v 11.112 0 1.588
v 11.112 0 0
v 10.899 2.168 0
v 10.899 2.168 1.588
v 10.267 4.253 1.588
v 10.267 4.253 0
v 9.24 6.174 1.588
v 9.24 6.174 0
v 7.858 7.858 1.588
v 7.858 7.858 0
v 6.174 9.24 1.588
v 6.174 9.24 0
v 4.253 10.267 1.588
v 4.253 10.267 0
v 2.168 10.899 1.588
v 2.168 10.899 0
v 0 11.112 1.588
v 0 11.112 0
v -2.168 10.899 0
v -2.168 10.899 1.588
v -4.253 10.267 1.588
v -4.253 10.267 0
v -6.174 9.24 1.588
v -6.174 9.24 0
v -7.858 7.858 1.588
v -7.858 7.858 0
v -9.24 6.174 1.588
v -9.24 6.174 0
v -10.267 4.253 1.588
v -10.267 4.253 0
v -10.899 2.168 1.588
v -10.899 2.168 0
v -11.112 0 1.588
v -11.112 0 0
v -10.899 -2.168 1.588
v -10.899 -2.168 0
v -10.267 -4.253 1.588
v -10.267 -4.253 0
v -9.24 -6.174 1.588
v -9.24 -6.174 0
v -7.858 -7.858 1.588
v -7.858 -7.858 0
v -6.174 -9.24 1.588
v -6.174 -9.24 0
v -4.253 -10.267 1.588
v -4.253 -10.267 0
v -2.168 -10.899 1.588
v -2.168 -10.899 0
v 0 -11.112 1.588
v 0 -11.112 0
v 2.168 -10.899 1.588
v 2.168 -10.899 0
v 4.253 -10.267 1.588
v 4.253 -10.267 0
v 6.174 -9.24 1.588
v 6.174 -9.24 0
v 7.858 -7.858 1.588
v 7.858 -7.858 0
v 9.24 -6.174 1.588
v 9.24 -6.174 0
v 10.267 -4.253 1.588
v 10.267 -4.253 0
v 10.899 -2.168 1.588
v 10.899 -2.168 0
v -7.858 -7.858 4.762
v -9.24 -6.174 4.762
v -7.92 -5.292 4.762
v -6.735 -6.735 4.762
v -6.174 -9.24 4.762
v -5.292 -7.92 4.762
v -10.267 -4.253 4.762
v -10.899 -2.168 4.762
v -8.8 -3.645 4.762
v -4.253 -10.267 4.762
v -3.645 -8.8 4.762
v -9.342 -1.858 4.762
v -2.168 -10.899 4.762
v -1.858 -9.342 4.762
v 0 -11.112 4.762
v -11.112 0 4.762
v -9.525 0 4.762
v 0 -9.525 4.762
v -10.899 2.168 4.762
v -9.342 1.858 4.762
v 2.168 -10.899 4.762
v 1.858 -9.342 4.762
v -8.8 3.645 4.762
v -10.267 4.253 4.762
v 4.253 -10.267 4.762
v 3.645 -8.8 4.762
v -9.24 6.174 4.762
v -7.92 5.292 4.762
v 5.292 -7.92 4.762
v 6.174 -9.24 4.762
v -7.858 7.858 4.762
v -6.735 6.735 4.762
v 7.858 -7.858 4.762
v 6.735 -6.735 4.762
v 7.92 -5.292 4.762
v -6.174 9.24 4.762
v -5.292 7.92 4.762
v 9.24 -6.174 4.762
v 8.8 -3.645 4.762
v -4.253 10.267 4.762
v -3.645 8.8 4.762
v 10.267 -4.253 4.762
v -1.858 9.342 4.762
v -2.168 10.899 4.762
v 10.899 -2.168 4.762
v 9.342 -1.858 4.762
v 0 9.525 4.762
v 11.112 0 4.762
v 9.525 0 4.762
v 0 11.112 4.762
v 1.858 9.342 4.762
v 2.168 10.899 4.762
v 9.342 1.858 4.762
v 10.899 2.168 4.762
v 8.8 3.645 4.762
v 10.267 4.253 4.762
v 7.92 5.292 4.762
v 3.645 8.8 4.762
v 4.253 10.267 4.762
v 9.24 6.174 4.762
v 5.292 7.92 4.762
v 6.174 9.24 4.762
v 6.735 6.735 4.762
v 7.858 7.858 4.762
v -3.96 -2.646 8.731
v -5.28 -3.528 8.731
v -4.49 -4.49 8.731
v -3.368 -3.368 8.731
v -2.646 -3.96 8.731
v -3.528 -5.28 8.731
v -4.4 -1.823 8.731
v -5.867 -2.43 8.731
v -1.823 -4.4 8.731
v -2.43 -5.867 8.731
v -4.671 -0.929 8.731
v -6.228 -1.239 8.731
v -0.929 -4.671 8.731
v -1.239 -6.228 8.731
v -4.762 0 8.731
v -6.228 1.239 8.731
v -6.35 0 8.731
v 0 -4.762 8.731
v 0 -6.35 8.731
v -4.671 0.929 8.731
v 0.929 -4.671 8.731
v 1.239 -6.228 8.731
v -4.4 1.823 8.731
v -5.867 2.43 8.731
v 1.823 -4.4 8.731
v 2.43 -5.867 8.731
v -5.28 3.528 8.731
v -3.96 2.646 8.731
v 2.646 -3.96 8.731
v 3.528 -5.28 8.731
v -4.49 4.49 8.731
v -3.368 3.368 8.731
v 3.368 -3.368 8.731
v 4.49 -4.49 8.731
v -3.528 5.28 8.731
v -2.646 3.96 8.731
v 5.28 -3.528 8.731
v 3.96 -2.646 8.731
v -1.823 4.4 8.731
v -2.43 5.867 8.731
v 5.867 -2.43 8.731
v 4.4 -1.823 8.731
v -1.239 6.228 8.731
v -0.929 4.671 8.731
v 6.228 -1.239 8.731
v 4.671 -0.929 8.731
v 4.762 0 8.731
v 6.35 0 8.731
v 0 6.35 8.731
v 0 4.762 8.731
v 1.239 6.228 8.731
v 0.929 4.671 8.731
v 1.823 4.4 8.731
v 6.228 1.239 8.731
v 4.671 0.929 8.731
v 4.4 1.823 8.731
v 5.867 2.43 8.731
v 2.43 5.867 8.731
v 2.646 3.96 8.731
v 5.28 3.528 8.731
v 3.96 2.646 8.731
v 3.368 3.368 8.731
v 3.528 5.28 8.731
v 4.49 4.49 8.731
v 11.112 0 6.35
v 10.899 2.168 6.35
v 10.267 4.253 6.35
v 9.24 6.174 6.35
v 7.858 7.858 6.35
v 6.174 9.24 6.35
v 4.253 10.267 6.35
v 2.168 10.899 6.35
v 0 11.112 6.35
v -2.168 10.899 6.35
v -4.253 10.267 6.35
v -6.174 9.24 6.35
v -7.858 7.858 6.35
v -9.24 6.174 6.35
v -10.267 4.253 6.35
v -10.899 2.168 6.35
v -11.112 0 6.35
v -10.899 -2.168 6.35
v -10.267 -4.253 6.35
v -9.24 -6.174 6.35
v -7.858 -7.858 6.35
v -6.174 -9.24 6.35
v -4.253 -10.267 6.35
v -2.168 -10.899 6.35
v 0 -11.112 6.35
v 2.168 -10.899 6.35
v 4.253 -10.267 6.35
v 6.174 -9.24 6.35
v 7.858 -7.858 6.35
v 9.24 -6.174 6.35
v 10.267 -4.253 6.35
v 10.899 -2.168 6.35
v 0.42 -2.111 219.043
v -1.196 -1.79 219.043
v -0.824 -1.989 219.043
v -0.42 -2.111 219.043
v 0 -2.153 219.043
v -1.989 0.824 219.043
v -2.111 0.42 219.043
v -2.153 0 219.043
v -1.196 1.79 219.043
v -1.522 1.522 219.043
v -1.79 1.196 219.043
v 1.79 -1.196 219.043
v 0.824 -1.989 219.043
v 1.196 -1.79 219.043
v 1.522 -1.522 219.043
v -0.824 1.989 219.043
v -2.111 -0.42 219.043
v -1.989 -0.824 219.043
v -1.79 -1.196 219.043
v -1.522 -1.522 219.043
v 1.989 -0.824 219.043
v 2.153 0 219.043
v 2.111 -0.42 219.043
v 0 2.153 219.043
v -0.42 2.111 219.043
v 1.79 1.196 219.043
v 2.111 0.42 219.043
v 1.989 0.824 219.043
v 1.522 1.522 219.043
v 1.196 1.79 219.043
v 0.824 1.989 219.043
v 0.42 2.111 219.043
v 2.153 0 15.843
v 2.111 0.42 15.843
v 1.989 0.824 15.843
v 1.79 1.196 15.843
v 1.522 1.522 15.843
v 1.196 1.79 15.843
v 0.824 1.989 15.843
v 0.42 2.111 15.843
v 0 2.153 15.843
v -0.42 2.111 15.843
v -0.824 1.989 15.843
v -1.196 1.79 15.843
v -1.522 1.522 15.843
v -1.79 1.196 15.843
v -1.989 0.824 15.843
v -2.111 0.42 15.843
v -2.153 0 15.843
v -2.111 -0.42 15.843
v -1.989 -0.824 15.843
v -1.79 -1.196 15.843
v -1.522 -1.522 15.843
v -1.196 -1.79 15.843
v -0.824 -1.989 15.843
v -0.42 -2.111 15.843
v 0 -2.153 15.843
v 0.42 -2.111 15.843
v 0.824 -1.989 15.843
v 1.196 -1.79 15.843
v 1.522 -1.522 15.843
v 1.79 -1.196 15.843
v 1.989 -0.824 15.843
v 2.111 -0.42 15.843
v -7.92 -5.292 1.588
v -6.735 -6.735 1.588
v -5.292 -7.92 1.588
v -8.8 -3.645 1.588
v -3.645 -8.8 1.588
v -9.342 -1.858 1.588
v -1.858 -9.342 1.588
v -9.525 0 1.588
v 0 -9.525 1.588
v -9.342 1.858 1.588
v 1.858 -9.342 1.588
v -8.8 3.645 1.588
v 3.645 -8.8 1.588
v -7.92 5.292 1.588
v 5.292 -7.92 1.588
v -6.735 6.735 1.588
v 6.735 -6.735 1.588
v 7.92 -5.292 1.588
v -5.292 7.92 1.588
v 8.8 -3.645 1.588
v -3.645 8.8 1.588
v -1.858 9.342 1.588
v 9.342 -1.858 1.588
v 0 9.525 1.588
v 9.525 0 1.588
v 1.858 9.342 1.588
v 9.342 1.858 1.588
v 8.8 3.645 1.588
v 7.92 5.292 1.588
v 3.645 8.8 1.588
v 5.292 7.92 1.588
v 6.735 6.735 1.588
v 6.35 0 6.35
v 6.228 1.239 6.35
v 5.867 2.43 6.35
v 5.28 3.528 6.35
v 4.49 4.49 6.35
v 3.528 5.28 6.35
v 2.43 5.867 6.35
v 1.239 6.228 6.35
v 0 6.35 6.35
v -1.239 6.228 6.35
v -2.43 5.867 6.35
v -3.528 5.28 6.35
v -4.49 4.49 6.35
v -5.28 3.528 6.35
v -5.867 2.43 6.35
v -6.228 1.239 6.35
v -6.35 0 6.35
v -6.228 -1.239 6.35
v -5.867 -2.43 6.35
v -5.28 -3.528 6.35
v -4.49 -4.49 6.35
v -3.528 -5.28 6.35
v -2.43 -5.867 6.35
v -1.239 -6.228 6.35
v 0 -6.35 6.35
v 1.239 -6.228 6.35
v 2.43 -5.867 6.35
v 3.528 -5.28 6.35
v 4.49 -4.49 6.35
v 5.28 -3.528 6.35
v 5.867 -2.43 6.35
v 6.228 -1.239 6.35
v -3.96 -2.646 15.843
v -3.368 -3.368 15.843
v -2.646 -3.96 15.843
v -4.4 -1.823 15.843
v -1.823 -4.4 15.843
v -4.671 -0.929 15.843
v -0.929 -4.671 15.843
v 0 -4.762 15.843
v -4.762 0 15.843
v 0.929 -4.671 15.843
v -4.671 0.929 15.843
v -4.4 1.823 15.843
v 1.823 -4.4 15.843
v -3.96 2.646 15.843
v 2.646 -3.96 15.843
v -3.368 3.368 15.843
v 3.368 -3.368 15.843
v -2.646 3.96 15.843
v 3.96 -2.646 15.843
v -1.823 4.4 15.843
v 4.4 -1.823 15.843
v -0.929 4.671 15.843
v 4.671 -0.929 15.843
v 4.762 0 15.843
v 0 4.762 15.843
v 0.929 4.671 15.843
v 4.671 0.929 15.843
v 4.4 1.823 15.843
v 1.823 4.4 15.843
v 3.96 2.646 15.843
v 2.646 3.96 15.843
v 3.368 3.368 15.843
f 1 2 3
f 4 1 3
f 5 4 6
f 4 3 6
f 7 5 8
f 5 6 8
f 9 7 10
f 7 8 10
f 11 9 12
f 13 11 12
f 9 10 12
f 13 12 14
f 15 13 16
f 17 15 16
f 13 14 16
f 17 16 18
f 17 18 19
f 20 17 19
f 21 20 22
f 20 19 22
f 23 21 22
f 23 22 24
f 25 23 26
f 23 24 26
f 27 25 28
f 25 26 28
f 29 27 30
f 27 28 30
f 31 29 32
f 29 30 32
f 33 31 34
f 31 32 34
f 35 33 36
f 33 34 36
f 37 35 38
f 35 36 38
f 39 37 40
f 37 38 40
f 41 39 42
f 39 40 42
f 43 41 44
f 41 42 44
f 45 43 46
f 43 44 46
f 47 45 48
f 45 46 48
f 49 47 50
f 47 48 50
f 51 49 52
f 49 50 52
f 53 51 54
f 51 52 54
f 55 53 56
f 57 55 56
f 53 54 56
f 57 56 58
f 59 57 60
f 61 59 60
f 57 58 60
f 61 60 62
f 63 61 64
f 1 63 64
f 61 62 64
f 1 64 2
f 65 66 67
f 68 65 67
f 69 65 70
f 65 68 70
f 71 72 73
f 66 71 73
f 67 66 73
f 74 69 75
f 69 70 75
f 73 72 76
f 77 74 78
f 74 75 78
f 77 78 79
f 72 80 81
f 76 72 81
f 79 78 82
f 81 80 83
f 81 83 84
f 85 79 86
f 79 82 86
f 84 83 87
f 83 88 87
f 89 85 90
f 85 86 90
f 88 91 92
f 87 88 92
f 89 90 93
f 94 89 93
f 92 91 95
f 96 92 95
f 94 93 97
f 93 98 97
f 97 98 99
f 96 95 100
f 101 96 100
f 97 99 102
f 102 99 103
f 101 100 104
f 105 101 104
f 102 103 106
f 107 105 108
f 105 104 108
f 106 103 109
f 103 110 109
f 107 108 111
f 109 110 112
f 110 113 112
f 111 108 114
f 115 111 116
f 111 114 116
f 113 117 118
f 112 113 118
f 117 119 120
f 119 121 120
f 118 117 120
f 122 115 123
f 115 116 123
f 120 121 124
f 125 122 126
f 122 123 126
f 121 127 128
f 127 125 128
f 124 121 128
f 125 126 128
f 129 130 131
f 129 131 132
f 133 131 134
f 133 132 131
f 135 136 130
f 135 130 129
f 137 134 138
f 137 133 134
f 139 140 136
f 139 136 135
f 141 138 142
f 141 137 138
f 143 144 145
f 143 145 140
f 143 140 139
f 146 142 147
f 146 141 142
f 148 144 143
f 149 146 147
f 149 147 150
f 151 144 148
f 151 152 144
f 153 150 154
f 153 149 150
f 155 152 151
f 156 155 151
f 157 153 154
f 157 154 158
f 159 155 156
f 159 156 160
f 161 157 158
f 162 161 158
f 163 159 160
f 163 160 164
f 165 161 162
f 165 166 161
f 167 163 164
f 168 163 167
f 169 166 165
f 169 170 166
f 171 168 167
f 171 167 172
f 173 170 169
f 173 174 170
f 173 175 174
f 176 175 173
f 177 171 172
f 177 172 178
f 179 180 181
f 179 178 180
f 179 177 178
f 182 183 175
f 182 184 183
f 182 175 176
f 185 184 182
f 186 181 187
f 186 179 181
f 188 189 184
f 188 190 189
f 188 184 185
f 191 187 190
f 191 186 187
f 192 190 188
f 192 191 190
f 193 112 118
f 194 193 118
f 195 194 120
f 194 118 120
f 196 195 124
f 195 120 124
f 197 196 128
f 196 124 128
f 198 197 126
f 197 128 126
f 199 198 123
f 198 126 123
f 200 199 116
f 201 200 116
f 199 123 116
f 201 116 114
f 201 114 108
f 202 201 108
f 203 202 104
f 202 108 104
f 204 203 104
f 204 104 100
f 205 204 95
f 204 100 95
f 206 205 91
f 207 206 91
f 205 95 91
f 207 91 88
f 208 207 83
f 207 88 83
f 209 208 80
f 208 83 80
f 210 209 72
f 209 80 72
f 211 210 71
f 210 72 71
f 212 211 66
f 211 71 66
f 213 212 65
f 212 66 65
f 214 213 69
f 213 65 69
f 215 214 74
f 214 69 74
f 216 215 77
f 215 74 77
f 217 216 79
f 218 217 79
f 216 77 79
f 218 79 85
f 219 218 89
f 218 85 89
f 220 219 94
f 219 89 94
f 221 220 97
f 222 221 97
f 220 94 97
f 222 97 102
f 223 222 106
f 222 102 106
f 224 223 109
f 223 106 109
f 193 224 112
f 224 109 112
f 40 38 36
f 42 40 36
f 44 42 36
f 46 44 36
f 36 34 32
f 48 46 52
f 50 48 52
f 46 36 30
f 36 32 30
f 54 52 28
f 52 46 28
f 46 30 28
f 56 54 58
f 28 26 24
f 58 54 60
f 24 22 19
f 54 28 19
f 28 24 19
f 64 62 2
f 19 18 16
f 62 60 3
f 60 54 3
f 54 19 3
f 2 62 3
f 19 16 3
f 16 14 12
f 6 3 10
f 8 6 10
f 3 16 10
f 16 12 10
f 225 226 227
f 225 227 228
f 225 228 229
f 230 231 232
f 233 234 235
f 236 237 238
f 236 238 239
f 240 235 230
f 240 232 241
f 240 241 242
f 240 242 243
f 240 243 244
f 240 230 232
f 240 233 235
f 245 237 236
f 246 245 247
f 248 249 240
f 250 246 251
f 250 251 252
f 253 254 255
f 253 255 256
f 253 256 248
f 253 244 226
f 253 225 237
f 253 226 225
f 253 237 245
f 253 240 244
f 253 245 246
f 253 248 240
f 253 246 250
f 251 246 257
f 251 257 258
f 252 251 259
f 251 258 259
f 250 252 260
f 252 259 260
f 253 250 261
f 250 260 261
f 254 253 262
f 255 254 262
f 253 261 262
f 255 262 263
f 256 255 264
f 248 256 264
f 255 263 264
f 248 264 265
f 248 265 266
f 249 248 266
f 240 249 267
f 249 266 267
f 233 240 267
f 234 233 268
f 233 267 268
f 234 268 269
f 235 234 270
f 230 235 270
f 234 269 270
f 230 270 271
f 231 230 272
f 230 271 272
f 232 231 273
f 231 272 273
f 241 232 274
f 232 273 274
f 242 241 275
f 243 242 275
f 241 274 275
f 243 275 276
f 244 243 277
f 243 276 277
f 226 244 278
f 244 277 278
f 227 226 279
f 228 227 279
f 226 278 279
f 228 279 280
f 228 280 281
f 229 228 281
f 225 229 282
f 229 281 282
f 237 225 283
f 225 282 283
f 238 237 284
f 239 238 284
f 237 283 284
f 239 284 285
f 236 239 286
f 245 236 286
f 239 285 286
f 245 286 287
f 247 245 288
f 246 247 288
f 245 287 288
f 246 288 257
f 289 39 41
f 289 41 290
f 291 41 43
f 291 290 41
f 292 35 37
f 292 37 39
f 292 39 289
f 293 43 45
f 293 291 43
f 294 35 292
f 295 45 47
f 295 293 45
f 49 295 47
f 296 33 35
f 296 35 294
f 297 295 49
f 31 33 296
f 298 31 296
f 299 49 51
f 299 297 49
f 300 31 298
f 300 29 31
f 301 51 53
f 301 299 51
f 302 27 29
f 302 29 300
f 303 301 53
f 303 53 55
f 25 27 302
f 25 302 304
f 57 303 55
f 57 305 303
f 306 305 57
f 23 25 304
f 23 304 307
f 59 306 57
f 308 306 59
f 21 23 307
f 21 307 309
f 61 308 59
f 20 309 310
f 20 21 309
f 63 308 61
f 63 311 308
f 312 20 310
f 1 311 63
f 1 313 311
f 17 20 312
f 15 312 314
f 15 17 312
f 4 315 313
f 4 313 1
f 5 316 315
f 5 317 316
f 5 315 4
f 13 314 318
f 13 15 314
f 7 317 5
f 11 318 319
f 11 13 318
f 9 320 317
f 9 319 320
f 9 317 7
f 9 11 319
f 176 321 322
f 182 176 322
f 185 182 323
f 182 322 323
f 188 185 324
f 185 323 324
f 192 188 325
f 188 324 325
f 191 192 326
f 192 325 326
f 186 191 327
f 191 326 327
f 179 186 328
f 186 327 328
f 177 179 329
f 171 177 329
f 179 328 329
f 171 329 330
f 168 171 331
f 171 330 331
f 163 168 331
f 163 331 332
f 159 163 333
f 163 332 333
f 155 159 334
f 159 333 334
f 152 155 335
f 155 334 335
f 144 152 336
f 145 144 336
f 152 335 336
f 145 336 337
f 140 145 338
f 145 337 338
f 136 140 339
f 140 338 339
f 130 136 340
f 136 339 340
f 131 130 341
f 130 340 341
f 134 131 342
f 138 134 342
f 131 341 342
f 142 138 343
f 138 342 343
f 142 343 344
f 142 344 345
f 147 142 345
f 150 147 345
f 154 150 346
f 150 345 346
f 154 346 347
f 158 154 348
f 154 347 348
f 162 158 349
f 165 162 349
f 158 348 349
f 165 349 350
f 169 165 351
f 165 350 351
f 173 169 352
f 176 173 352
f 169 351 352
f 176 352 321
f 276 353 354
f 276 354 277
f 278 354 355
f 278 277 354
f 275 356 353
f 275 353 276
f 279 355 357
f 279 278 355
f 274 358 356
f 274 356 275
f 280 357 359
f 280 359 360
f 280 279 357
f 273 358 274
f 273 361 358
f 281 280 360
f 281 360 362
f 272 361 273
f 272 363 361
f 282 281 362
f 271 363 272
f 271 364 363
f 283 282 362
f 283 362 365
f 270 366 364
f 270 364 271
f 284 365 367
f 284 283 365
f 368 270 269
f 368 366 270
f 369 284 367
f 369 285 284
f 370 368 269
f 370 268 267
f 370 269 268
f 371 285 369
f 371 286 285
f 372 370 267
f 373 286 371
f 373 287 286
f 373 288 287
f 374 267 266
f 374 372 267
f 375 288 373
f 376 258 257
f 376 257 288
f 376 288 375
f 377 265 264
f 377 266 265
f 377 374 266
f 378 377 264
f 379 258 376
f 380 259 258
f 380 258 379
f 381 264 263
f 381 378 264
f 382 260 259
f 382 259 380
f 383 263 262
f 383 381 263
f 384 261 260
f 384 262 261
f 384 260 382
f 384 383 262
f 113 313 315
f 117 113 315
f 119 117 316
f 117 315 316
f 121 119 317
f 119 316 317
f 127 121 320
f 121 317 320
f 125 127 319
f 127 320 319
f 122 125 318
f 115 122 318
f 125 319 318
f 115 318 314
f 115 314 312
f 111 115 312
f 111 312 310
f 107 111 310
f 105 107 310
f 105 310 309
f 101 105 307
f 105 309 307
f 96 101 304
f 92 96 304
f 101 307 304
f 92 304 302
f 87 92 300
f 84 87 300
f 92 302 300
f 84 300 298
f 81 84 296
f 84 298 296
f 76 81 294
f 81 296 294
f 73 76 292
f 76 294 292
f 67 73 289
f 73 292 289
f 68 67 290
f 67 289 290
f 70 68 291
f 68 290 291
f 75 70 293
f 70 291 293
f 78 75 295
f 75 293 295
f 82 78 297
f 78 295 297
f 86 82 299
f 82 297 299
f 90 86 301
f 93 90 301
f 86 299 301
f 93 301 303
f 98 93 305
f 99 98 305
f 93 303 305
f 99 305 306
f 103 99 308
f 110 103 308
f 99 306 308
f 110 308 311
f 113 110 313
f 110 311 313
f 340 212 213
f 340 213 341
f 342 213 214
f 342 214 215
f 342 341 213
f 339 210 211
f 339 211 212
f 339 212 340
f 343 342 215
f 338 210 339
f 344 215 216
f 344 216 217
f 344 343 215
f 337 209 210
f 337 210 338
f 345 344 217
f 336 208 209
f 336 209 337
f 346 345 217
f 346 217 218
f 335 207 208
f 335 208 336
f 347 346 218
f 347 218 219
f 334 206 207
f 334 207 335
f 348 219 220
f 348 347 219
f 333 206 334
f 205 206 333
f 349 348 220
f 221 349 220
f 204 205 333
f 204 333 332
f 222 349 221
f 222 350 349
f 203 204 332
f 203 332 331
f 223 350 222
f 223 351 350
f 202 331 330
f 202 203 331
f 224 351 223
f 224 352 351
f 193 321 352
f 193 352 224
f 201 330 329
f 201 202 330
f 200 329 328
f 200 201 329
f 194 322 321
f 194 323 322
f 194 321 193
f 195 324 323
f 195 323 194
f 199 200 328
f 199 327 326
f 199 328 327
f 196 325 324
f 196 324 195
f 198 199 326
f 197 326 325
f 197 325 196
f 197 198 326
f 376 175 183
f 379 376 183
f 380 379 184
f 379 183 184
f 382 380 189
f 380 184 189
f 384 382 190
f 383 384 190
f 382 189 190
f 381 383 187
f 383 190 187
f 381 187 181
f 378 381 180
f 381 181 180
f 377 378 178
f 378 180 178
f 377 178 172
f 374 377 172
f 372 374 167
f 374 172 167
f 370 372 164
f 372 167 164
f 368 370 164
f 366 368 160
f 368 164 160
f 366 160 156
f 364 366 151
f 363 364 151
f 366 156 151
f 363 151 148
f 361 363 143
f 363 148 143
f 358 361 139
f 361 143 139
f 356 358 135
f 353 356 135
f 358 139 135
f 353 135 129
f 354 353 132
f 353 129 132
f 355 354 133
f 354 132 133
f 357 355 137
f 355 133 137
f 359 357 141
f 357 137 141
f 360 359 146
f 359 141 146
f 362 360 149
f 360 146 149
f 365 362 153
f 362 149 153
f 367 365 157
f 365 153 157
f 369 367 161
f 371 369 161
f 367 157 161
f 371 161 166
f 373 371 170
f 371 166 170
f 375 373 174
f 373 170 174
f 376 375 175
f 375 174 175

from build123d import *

# Parameters (mm, degrees)
F0_R      = 11.1125
F1_DEPTH  = 1.5875
F2_R      = 9.525
F3_DEPTH  = 3.175
F4_R      = 11.1125
F5_DEPTH  = 1.5875
F6_R      = 6.35
F7_DEPTH  = 2.38125
F8_R      = 4.7625
F9_DEPTH  = 7.112
F10_R     = 2.15265
F11_DEPTH = 203.2


with BuildPart() as f1:
    # F0 (on Top) → F1 (new body)
    with BuildSketch(Plane.XY):
        Circle(F0_R)
    extrude(amount=F1_DEPTH)

    # F2 (on face) → F3 (join)
    with BuildSketch(Plane.XY.offset(1.5875)):
        Circle(F2_R)
    extrude(amount=F3_DEPTH)

    # F4 (on face) → F5 (join)
    with BuildSketch(Plane.XY.offset(4.7625)):
        Circle(F4_R)
    extrude(amount=F5_DEPTH)

    # F6 (on face) → F7 (join)
    with BuildSketch(Plane.XY.offset(6.35)):
        Circle(F6_R)
    extrude(amount=F7_DEPTH)

    # F8 (on face) → F9 (join)
    with BuildSketch(Plane.XY.offset(8.73125)):
        Circle(F8_R)
    extrude(amount=F9_DEPTH)

    # F10 (on face) → F11 (join)
    with BuildSketch(Plane.XY.offset(15.84325)):
        Circle(F10_R)
    extrude(amount=F11_DEPTH)


solid = f1.part
